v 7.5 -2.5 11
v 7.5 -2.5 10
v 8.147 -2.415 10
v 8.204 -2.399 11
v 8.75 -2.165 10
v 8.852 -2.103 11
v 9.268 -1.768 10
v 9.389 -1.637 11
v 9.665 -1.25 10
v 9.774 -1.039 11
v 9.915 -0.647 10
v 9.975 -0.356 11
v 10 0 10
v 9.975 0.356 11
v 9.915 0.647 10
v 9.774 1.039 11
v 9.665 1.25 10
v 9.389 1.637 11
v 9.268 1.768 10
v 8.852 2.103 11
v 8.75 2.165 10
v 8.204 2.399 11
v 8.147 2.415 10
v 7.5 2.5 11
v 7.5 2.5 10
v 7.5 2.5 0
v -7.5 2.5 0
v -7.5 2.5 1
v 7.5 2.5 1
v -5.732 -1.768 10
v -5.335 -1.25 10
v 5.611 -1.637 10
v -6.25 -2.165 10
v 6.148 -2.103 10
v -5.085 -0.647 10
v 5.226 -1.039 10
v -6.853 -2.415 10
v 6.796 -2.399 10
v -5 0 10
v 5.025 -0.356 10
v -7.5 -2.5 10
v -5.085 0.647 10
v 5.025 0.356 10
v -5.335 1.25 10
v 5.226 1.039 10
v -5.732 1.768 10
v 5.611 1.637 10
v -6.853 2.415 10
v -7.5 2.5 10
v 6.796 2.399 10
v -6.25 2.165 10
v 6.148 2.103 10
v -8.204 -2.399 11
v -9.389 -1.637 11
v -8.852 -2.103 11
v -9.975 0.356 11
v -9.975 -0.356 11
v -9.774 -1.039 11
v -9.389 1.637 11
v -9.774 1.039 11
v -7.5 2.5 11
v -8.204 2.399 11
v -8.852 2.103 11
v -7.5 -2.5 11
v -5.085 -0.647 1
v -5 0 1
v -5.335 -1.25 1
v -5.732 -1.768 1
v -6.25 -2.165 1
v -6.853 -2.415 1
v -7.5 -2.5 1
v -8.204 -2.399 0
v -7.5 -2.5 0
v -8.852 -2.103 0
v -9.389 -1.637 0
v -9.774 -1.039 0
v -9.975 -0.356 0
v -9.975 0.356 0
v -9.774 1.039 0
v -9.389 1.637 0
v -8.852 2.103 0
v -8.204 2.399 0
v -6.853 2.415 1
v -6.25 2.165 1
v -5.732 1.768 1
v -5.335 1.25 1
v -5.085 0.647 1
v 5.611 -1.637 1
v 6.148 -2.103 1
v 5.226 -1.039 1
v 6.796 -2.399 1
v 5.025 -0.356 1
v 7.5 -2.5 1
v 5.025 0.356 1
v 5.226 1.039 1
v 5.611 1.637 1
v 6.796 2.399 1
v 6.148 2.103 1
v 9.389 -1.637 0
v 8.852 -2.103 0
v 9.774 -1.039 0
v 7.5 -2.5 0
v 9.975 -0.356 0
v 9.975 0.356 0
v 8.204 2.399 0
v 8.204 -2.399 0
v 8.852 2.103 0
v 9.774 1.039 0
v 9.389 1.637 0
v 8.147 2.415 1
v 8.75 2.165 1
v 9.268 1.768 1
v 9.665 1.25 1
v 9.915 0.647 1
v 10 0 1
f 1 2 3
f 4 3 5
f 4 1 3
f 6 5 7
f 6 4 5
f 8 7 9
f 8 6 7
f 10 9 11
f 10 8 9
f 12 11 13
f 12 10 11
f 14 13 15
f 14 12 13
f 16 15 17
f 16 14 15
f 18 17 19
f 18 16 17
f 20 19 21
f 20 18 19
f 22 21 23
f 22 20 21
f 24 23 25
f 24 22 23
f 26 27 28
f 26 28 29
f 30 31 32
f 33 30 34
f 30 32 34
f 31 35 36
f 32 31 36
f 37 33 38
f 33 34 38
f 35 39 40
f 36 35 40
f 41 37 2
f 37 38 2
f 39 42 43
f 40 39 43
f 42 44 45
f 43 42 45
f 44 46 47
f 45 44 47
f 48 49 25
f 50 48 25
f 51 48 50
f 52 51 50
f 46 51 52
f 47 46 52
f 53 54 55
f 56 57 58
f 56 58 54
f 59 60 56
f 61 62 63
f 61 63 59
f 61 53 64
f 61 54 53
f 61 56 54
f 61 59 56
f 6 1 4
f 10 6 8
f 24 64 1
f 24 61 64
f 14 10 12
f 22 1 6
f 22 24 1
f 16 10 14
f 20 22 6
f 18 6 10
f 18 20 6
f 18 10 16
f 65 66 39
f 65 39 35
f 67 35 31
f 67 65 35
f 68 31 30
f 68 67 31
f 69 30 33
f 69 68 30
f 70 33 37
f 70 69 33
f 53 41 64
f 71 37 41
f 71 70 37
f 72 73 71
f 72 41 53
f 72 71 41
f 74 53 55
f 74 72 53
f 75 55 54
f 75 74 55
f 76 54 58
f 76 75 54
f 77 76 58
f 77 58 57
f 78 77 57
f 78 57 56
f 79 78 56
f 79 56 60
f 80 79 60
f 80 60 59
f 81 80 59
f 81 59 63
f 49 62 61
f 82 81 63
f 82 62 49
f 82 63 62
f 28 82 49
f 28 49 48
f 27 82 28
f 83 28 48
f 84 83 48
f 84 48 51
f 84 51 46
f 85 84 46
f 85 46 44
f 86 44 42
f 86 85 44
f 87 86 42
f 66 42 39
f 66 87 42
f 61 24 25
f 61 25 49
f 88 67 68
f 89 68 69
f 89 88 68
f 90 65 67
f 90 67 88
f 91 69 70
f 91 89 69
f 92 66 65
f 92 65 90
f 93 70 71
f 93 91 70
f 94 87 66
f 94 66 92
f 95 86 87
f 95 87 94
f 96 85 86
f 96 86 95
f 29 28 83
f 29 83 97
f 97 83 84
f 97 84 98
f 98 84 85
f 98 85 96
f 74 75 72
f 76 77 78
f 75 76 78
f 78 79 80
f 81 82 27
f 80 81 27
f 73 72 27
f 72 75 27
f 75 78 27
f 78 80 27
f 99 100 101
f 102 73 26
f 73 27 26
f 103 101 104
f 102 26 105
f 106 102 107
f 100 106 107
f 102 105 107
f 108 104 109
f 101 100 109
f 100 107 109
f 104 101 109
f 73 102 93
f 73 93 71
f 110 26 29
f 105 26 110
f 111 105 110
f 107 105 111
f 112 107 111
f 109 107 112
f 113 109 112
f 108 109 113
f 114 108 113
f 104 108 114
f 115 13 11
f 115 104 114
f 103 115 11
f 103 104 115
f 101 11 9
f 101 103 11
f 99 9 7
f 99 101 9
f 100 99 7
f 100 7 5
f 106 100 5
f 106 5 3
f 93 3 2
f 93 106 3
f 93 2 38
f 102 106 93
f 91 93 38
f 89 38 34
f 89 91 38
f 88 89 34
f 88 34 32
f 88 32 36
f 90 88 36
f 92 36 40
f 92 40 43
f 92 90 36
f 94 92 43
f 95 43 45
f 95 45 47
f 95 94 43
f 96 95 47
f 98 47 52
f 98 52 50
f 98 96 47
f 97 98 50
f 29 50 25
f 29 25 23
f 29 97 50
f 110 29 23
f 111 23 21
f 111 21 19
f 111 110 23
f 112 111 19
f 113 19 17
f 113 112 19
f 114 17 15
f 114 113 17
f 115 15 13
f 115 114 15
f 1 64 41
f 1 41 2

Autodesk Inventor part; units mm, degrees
ref_plane "YZ Plane" through (0, 0, 0) normal (1, 0, 0) x (0, 1, 0)
ref_plane "XZ Plane" through (0, 0, 0) normal (0, 1, 0) x (-1, 0, 0)
sketch "Sketch1" plane through (0, 0, 0) normal (0, 0, 1) x (1, 0, 0)
  line L0 (-7.5, 2.5) -> (7.5, 2.5)
  line L1 (7.5, -2.5) -> (-7.5, -2.5)
  line L2 (-7.5, 2.5) -> (7.5, -2.5) construction
  line L3 (7.5, 2.5) -> (-7.5, -2.5) construction
  circle A0 centre (-7.5, 0) radius 2.5
  circle A1 centre (7.5, 0) radius 2.5
  point P0 (0, 0)
  point P1 (0, 0)
  point P2 (0, 0)
  dimension "d1" = 5
  dimension "d9" = 7.5
  dimension "d10" = 7.5
extrude "Extrusion1" add sketch "Sketch1" along normal blind 1
extrude "Extrusion2" add sketch "Sketch1" along normal blind 10 contours A0 | A1
ref_plane "Work Plane1" through (0, 0, 11) normal (0, 0, 1) x (1, 0, 0)
sketch "Sketch2" plane through (0, 0, 11) normal (0, 0, 1) x (1, 0, 0)
  arc A0 (7.5, 2.5) -> (7.5, -2.5) centre (7.5, 0) ccw projected
  line L0 (7.5, 2.5) -> (-7.5, 2.5) projected
  arc A1 (-7.5, -2.5) -> (-7.5, 2.5) centre (-7.5, 0) ccw projected
  line L1 (-7.5, -2.5) -> (7.5, -2.5) projected
  circle A2 centre (-7.5, 0) radius 2.5 projected
  circle A3 centre (7.5, 0) radius 2.5 projected
  point P0 (0, 0)
  point P1 (-7.5, -2.5)
  point P2 (7.5, -2.5)
extrude "Extrusion3" add sketch "Sketch2" against normal blind 1
equation "\"d9\" = d10"
